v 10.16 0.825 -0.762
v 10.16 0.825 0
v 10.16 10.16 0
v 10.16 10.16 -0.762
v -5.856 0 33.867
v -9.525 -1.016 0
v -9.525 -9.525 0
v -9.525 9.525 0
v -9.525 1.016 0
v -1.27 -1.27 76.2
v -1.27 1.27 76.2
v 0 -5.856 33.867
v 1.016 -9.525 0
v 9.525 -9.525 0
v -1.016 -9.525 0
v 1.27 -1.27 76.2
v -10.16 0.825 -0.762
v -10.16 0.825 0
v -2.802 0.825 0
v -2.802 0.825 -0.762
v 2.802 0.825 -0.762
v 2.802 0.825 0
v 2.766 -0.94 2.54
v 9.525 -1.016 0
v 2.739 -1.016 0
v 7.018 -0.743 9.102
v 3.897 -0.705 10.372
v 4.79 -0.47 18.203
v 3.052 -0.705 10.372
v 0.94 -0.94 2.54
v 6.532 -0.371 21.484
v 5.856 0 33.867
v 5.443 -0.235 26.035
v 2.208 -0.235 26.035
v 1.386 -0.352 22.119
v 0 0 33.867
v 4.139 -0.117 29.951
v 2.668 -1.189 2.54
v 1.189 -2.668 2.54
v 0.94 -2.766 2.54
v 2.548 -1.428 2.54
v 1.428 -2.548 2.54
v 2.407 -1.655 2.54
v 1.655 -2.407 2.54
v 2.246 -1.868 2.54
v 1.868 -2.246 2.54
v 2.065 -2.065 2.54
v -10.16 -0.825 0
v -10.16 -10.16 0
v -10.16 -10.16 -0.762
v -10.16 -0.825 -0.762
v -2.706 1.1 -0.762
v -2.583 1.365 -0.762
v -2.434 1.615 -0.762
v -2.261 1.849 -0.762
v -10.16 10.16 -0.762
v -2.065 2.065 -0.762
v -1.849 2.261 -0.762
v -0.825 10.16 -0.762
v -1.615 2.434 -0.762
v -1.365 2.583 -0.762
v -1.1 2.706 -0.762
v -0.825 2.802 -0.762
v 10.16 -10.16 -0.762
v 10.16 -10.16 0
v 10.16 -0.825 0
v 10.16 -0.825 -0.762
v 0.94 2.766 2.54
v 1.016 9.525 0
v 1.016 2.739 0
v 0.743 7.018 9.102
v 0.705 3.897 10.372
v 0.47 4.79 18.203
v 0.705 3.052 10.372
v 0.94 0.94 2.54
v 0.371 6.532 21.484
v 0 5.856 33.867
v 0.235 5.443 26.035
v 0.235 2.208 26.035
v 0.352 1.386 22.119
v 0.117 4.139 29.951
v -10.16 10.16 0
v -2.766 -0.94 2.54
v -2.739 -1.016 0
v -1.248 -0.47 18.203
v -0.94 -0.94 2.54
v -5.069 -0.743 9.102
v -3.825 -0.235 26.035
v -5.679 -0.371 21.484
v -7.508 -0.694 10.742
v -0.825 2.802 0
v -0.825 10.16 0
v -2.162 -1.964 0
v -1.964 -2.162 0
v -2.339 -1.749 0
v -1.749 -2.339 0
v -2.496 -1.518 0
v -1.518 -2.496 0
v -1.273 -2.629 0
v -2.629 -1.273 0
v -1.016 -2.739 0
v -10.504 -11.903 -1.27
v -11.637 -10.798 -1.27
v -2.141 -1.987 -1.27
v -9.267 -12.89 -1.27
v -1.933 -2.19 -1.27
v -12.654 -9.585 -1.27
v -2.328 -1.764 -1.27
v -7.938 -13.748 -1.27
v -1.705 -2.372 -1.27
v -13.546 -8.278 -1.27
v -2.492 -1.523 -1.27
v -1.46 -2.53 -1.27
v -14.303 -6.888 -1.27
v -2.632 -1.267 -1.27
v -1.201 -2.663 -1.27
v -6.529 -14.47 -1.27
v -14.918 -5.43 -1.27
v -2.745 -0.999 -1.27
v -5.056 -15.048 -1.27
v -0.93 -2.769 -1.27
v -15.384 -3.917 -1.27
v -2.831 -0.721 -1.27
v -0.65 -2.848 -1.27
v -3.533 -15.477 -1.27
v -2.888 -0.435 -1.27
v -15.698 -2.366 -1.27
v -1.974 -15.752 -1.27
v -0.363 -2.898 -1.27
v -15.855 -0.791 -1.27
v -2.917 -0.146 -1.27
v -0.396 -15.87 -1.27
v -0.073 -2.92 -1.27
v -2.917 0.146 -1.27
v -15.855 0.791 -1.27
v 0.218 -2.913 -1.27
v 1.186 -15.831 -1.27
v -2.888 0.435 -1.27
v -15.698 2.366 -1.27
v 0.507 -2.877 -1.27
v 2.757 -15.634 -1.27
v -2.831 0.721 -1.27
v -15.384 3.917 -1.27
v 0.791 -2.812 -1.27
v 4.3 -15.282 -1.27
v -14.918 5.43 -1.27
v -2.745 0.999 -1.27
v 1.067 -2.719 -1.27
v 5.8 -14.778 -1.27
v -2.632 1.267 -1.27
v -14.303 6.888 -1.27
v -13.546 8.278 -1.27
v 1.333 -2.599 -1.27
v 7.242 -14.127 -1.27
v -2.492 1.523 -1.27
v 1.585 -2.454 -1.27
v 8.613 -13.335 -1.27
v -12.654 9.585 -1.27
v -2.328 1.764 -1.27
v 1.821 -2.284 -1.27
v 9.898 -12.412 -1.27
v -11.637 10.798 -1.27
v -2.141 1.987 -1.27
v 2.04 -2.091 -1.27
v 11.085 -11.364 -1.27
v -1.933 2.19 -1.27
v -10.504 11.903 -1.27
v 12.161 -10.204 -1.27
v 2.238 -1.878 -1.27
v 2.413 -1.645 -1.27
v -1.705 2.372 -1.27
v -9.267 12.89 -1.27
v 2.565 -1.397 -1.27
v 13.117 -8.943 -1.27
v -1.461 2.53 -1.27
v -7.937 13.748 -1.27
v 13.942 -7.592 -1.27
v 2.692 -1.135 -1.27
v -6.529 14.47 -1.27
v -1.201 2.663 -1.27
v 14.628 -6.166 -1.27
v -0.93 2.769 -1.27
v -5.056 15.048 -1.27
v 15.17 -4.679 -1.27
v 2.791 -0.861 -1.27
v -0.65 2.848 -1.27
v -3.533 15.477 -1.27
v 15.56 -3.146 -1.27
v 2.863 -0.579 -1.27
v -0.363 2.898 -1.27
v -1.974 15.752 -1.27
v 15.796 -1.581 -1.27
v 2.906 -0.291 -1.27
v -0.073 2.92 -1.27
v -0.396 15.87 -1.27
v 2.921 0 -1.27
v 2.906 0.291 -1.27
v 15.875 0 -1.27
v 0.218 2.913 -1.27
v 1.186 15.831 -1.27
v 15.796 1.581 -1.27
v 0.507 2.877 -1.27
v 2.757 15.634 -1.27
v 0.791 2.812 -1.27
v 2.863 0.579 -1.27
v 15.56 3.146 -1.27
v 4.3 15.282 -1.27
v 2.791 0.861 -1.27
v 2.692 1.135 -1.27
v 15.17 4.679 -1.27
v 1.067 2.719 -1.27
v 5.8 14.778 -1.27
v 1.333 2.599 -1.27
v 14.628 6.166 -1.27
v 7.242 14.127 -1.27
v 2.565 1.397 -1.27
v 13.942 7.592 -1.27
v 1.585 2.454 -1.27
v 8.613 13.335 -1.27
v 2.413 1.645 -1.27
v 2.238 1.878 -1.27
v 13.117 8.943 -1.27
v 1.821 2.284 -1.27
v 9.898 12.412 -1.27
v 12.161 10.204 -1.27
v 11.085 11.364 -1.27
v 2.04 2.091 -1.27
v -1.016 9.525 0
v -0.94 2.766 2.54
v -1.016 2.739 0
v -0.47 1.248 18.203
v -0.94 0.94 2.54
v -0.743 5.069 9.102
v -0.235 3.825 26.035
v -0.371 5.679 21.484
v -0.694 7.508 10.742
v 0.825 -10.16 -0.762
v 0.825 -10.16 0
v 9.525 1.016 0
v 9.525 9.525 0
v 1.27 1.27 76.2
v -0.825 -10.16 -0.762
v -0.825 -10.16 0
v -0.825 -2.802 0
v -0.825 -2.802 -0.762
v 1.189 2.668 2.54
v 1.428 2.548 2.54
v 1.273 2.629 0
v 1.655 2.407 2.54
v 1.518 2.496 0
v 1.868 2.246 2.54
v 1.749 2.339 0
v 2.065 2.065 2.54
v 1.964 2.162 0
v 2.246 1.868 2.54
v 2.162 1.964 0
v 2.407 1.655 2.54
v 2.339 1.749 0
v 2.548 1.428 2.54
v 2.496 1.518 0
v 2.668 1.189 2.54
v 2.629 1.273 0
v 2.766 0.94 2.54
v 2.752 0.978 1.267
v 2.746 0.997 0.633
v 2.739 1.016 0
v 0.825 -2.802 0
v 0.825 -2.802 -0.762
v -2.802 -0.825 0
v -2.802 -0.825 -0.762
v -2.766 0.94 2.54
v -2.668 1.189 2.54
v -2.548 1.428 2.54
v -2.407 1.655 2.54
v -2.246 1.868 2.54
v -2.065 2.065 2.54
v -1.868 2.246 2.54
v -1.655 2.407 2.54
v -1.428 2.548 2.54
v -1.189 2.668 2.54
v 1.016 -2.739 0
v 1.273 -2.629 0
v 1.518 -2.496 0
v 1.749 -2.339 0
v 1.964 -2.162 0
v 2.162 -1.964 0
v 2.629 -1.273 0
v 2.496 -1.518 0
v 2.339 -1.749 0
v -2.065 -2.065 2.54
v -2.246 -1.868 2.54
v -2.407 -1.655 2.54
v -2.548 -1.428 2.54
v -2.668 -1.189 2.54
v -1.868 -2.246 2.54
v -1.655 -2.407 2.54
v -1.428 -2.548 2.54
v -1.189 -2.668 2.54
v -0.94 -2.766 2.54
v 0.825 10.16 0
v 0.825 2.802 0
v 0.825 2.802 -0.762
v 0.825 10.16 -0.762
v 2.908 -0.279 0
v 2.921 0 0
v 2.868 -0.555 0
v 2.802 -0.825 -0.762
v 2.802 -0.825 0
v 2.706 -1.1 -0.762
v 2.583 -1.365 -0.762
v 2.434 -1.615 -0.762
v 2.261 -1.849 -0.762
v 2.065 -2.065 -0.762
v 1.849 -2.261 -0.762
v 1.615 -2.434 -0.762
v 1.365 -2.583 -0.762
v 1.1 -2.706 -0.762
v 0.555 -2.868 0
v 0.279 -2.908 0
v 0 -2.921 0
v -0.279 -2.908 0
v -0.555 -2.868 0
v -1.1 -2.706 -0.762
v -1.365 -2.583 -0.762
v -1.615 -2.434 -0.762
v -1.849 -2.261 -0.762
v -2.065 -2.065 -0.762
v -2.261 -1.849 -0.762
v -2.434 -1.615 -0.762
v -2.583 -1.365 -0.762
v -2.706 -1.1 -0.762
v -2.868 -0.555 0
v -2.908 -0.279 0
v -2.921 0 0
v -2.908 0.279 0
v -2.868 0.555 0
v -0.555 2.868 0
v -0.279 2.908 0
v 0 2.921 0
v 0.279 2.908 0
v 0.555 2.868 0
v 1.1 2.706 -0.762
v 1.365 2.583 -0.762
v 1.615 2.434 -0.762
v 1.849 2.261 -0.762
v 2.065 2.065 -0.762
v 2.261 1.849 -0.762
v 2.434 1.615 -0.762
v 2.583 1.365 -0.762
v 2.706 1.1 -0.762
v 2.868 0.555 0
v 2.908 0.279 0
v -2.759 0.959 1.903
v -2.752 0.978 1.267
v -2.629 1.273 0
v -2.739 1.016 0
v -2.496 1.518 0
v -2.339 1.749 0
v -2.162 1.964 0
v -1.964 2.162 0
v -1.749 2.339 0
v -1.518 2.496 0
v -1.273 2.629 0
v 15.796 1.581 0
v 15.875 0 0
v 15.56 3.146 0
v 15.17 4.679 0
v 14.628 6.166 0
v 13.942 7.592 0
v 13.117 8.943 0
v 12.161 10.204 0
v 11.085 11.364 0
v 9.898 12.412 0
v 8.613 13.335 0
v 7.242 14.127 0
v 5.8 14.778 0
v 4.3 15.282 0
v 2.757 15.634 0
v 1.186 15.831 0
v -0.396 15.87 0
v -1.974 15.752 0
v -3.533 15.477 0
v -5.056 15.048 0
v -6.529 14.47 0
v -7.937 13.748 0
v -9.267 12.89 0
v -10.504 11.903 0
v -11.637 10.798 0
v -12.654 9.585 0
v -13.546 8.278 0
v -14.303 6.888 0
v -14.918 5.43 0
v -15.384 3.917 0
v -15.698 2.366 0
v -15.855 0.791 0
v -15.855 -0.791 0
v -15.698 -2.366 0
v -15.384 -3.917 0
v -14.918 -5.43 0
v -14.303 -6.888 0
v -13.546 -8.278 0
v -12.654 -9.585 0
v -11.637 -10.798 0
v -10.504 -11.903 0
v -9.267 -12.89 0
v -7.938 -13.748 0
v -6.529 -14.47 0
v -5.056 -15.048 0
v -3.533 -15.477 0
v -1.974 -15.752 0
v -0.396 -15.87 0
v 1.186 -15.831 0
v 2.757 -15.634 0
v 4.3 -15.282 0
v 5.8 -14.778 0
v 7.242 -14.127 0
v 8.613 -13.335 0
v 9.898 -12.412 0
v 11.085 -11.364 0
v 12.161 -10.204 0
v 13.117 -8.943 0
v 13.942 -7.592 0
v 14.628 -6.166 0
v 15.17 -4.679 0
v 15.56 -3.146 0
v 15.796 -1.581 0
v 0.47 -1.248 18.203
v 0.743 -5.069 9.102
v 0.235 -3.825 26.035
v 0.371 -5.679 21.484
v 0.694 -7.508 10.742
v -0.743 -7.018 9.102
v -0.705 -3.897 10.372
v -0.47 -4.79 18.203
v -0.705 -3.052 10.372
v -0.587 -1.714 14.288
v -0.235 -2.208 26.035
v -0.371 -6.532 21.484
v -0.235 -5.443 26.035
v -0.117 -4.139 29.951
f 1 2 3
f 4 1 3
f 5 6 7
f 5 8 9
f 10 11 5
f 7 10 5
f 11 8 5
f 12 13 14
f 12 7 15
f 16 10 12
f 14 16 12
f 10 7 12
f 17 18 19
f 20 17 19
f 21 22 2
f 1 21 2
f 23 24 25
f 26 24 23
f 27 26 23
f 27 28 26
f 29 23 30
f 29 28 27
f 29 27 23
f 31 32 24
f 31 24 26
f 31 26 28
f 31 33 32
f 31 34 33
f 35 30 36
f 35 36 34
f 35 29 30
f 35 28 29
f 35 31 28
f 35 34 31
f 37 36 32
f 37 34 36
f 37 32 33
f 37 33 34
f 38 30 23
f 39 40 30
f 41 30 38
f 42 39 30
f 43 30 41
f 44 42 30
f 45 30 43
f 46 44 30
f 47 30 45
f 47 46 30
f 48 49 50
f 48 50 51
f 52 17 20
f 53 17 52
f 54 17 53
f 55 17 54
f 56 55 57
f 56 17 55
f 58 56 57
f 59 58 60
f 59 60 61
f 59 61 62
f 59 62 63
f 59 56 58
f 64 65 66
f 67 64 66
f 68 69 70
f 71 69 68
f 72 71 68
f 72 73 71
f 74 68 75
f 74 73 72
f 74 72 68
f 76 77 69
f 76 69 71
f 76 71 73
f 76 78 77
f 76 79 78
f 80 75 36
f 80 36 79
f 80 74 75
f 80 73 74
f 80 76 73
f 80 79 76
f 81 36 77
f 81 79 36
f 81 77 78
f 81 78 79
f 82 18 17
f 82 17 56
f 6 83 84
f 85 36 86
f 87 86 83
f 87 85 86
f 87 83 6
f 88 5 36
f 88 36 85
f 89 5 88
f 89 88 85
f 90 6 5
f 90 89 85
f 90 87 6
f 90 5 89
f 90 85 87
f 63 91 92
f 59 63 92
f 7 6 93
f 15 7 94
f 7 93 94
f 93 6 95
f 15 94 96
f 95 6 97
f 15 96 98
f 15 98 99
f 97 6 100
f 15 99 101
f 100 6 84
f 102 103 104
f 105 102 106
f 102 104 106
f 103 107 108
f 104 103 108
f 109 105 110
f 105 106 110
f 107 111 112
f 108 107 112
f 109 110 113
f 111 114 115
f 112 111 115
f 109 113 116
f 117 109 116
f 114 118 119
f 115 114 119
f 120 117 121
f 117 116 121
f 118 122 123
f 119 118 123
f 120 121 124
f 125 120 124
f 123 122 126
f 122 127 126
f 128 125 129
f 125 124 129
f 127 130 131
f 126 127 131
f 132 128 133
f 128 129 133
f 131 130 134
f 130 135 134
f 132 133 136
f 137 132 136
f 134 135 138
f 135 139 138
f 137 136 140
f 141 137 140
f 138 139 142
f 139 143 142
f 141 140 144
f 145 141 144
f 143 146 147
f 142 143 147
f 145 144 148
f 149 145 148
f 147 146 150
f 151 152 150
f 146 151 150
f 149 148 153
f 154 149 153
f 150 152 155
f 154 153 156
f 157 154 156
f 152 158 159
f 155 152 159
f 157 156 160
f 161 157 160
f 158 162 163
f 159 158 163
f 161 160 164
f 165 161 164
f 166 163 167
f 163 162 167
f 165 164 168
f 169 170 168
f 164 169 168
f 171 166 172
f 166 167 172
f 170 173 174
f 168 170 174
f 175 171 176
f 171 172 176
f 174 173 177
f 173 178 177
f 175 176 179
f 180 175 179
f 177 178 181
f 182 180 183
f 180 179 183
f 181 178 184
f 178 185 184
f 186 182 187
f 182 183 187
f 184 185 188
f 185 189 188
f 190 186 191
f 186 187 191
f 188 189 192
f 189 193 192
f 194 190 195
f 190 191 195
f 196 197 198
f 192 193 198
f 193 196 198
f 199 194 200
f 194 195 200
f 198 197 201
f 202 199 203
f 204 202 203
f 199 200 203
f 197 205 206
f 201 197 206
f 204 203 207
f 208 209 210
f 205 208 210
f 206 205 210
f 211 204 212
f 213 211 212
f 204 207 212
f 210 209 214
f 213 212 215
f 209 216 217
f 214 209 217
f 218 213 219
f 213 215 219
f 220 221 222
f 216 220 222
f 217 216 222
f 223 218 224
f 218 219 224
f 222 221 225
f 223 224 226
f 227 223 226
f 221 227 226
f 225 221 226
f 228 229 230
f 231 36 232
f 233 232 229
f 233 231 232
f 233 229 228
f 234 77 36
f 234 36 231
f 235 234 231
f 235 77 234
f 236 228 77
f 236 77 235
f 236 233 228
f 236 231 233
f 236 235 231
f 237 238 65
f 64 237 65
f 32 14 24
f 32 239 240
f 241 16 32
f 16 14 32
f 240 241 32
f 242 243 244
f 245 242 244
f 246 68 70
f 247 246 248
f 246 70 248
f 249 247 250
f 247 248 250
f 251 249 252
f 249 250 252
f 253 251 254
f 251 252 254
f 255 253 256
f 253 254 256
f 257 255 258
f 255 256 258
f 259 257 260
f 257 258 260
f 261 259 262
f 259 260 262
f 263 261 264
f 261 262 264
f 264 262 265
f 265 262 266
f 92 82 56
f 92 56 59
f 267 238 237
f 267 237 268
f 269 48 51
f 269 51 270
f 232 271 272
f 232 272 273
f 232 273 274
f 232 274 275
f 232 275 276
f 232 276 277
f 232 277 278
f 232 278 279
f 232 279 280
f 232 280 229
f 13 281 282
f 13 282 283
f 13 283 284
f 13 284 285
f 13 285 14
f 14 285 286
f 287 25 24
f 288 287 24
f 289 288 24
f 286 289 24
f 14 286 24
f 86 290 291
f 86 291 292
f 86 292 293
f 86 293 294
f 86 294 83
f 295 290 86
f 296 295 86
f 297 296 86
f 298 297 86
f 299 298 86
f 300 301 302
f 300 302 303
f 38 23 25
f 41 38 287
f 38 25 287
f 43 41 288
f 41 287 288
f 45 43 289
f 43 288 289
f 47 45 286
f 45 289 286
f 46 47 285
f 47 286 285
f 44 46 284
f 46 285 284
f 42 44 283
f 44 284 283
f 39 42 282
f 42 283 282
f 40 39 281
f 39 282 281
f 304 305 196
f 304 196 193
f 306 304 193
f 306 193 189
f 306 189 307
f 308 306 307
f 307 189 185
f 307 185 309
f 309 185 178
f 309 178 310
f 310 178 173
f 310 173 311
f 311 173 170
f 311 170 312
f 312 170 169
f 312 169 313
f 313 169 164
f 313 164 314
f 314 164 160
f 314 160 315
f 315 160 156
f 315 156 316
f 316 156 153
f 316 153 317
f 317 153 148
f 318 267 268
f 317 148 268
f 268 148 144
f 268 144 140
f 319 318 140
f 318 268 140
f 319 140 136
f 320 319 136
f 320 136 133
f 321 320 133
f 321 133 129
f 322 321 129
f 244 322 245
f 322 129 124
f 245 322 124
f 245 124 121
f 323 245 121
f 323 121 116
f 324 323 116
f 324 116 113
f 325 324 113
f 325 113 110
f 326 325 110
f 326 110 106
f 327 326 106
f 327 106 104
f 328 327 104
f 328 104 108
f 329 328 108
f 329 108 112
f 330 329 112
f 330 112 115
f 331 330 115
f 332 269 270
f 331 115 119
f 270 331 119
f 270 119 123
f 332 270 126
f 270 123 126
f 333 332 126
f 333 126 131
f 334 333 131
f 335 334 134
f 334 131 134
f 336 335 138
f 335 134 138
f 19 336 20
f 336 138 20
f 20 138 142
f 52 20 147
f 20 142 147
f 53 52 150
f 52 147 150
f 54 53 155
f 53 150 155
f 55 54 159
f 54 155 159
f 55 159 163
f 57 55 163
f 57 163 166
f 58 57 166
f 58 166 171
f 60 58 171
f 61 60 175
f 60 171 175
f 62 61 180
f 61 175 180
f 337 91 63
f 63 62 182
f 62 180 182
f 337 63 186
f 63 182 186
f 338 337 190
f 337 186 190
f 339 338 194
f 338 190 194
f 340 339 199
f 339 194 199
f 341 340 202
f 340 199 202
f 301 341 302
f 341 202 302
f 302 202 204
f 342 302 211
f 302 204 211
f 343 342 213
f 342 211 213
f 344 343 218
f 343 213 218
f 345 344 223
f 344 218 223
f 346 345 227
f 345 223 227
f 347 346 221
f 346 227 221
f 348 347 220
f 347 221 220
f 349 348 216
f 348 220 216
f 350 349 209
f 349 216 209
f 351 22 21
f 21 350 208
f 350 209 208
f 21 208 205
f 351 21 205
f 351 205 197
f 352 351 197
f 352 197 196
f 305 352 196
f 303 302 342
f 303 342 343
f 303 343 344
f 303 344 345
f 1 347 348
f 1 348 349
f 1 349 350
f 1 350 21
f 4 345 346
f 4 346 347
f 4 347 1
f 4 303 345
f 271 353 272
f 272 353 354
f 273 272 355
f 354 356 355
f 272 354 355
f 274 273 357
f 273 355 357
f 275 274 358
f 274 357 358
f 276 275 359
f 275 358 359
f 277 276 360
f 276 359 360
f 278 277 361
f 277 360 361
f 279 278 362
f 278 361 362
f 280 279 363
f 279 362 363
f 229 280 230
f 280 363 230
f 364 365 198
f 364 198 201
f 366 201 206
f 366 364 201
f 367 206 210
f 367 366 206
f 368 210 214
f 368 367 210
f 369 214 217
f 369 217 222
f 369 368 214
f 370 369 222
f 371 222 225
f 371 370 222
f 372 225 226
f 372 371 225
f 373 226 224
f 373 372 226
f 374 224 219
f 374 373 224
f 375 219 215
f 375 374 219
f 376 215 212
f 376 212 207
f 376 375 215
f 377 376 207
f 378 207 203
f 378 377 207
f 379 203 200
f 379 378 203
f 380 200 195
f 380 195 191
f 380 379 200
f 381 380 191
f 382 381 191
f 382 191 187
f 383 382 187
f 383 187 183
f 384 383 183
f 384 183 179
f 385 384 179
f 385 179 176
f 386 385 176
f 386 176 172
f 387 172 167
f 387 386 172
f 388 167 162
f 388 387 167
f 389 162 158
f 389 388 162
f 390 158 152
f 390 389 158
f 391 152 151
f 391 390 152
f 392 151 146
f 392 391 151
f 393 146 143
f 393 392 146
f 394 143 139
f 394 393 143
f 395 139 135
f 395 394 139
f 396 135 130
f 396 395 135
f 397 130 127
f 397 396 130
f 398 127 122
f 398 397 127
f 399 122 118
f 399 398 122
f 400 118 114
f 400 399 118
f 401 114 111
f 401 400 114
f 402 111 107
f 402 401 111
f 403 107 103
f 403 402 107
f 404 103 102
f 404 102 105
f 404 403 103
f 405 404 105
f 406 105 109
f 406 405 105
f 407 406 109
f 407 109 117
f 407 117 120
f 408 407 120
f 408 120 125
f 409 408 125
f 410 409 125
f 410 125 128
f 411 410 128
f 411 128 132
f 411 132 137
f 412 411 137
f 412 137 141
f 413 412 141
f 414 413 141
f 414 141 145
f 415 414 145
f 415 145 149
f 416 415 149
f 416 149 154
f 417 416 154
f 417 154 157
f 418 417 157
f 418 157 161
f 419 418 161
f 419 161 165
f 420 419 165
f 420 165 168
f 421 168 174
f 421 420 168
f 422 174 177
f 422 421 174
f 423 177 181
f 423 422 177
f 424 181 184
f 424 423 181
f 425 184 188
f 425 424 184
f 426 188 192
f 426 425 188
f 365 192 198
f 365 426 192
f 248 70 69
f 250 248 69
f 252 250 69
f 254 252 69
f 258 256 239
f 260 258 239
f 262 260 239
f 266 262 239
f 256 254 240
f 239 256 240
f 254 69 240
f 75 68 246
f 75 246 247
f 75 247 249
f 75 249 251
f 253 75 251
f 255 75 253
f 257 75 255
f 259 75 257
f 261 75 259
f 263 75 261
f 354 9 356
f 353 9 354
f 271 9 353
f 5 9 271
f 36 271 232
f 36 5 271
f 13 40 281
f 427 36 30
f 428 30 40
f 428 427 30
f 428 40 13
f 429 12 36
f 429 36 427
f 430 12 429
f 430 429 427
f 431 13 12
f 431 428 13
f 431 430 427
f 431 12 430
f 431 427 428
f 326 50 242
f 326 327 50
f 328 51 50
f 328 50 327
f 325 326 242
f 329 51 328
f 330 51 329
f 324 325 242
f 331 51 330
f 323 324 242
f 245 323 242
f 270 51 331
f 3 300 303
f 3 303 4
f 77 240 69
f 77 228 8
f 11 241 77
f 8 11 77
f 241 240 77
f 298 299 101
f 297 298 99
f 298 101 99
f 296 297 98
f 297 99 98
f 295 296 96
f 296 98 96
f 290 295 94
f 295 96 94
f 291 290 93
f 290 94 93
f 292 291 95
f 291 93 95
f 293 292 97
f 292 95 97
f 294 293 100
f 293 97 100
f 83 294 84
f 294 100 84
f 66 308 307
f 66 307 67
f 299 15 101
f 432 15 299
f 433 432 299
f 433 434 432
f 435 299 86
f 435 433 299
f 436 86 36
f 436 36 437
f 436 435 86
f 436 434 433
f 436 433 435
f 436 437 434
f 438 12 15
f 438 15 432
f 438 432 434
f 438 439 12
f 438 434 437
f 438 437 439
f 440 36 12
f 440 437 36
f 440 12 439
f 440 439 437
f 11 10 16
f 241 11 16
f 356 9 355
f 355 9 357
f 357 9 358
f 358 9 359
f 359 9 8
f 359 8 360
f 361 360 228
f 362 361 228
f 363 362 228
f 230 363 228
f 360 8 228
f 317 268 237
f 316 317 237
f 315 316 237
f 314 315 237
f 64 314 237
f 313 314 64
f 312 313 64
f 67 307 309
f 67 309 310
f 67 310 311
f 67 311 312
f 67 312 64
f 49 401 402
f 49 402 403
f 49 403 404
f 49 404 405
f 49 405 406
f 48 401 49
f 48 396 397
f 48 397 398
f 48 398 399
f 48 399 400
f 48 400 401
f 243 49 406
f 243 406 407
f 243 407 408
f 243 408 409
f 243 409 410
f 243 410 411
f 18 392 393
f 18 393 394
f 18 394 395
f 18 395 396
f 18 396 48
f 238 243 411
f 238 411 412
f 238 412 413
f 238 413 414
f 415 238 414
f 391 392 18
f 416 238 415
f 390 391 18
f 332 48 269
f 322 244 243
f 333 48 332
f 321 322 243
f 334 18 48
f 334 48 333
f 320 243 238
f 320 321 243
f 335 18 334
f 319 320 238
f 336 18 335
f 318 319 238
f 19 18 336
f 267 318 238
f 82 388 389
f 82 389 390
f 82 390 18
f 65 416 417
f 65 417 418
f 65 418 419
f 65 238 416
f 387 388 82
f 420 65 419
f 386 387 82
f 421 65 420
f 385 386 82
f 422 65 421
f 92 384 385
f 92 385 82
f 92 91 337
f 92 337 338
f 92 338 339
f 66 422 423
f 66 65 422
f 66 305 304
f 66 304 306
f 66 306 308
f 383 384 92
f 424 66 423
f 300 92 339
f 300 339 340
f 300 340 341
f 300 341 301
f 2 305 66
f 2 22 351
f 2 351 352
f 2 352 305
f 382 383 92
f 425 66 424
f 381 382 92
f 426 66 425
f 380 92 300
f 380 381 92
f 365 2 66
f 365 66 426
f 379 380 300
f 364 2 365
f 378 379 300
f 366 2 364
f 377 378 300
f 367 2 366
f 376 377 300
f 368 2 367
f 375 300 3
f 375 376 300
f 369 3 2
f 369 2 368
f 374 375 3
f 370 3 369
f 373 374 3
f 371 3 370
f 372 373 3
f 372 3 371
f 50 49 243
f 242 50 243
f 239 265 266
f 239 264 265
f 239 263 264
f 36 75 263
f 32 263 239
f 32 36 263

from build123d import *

# Parameters (mm, degrees)
F0_R      = 15.875
F1_DEPTH  = 1.27
F2_W      = 8.509
F2_H      = 8.509
F4_W      = 2.54
F4_H      = 2.54
F5_FACE_W = 2.54
F5_FACE_H = 2.54
F9_W      = 9.3345
F9_H      = 9.3345
F10_DEPTH = 0.762
F11_R     = 2.921
F12_DEPTH = 3.81


with BuildPart() as f1:
    # F0 (on Top) → F1 (new body)
    with BuildSketch(Plane.XY):
        Circle(F0_R)
    extrude(amount=-F1_DEPTH)



with BuildPart() as f5:
    # F2 (on Top) → F5 section 0
    with BuildSketch(Plane.XY):
        with Locations((-5.2705, 5.2705)):
            Rectangle(F2_W, F2_H)
    # F4 (on offset) → F5 section 1
    with BuildSketch(Plane.XY.offset(76.2)):
        Rectangle(F4_W, F4_H)
    loft()


with BuildPart() as f1_1:
    add(f1.part)

    add(f5.part)  # F6 merges F5
    # F2 (on Top) → F6 section 0
    with BuildSketch(Plane.XY):
        with Locations((5.2705, 5.2705)):
            Rectangle(F2_W, F2_H)
    # F5_face (on face) → F6 section 1
    with BuildSketch(Plane.XY.offset(76.2)):
        Rectangle(F5_FACE_W, F5_FACE_H)
    loft()

    # F2 (on Top) → F7 section 0
    with BuildSketch(Plane.XY):
        with Locations((-5.2705, -5.2705)):
            Rectangle(F2_W, F2_H)
    # F5_face (on face) → F7 section 1
    with BuildSketch(Plane.XY.offset(76.2)):
        Rectangle(F5_FACE_W, F5_FACE_H)
    loft()

    # F2 (on Top) → F8 section 0
    with BuildSketch(Plane.XY):
        with Locations((5.2705, -5.2705)):
            Rectangle(F2_W, F2_H)
    # F5_face (on face) → F8 section 1
    with BuildSketch(Plane.XY.offset(76.2)):
        Rectangle(F5_FACE_W, F5_FACE_H)
    loft()

    # F9 (on face) → F10 (cut)
    with BuildSketch(Plane.XY):
        with Locations((5.49275, 5.49275)):
            Rectangle(F9_W, F9_H)
        with Locations((-5.49275, 5.49275)):
            Rectangle(F9_W, F9_H)
        with Locations((5.49275, -5.49275)):
            Rectangle(F9_W, F9_H)
        with Locations((-5.49275, -5.49275)):
            Rectangle(F9_W, F9_H)
    extrude(amount=-F10_DEPTH, mode=Mode.SUBTRACT)

    # F11 (on face) → F12 (cut)
    with BuildSketch(Plane(origin=(0, 0, -1.27), x_dir=(1, 0, 0), z_dir=(0, 0, -1))):
        Circle(F11_R)
    extrude(amount=-F12_DEPTH, mode=Mode.SUBTRACT)


solid = f1_1.part
